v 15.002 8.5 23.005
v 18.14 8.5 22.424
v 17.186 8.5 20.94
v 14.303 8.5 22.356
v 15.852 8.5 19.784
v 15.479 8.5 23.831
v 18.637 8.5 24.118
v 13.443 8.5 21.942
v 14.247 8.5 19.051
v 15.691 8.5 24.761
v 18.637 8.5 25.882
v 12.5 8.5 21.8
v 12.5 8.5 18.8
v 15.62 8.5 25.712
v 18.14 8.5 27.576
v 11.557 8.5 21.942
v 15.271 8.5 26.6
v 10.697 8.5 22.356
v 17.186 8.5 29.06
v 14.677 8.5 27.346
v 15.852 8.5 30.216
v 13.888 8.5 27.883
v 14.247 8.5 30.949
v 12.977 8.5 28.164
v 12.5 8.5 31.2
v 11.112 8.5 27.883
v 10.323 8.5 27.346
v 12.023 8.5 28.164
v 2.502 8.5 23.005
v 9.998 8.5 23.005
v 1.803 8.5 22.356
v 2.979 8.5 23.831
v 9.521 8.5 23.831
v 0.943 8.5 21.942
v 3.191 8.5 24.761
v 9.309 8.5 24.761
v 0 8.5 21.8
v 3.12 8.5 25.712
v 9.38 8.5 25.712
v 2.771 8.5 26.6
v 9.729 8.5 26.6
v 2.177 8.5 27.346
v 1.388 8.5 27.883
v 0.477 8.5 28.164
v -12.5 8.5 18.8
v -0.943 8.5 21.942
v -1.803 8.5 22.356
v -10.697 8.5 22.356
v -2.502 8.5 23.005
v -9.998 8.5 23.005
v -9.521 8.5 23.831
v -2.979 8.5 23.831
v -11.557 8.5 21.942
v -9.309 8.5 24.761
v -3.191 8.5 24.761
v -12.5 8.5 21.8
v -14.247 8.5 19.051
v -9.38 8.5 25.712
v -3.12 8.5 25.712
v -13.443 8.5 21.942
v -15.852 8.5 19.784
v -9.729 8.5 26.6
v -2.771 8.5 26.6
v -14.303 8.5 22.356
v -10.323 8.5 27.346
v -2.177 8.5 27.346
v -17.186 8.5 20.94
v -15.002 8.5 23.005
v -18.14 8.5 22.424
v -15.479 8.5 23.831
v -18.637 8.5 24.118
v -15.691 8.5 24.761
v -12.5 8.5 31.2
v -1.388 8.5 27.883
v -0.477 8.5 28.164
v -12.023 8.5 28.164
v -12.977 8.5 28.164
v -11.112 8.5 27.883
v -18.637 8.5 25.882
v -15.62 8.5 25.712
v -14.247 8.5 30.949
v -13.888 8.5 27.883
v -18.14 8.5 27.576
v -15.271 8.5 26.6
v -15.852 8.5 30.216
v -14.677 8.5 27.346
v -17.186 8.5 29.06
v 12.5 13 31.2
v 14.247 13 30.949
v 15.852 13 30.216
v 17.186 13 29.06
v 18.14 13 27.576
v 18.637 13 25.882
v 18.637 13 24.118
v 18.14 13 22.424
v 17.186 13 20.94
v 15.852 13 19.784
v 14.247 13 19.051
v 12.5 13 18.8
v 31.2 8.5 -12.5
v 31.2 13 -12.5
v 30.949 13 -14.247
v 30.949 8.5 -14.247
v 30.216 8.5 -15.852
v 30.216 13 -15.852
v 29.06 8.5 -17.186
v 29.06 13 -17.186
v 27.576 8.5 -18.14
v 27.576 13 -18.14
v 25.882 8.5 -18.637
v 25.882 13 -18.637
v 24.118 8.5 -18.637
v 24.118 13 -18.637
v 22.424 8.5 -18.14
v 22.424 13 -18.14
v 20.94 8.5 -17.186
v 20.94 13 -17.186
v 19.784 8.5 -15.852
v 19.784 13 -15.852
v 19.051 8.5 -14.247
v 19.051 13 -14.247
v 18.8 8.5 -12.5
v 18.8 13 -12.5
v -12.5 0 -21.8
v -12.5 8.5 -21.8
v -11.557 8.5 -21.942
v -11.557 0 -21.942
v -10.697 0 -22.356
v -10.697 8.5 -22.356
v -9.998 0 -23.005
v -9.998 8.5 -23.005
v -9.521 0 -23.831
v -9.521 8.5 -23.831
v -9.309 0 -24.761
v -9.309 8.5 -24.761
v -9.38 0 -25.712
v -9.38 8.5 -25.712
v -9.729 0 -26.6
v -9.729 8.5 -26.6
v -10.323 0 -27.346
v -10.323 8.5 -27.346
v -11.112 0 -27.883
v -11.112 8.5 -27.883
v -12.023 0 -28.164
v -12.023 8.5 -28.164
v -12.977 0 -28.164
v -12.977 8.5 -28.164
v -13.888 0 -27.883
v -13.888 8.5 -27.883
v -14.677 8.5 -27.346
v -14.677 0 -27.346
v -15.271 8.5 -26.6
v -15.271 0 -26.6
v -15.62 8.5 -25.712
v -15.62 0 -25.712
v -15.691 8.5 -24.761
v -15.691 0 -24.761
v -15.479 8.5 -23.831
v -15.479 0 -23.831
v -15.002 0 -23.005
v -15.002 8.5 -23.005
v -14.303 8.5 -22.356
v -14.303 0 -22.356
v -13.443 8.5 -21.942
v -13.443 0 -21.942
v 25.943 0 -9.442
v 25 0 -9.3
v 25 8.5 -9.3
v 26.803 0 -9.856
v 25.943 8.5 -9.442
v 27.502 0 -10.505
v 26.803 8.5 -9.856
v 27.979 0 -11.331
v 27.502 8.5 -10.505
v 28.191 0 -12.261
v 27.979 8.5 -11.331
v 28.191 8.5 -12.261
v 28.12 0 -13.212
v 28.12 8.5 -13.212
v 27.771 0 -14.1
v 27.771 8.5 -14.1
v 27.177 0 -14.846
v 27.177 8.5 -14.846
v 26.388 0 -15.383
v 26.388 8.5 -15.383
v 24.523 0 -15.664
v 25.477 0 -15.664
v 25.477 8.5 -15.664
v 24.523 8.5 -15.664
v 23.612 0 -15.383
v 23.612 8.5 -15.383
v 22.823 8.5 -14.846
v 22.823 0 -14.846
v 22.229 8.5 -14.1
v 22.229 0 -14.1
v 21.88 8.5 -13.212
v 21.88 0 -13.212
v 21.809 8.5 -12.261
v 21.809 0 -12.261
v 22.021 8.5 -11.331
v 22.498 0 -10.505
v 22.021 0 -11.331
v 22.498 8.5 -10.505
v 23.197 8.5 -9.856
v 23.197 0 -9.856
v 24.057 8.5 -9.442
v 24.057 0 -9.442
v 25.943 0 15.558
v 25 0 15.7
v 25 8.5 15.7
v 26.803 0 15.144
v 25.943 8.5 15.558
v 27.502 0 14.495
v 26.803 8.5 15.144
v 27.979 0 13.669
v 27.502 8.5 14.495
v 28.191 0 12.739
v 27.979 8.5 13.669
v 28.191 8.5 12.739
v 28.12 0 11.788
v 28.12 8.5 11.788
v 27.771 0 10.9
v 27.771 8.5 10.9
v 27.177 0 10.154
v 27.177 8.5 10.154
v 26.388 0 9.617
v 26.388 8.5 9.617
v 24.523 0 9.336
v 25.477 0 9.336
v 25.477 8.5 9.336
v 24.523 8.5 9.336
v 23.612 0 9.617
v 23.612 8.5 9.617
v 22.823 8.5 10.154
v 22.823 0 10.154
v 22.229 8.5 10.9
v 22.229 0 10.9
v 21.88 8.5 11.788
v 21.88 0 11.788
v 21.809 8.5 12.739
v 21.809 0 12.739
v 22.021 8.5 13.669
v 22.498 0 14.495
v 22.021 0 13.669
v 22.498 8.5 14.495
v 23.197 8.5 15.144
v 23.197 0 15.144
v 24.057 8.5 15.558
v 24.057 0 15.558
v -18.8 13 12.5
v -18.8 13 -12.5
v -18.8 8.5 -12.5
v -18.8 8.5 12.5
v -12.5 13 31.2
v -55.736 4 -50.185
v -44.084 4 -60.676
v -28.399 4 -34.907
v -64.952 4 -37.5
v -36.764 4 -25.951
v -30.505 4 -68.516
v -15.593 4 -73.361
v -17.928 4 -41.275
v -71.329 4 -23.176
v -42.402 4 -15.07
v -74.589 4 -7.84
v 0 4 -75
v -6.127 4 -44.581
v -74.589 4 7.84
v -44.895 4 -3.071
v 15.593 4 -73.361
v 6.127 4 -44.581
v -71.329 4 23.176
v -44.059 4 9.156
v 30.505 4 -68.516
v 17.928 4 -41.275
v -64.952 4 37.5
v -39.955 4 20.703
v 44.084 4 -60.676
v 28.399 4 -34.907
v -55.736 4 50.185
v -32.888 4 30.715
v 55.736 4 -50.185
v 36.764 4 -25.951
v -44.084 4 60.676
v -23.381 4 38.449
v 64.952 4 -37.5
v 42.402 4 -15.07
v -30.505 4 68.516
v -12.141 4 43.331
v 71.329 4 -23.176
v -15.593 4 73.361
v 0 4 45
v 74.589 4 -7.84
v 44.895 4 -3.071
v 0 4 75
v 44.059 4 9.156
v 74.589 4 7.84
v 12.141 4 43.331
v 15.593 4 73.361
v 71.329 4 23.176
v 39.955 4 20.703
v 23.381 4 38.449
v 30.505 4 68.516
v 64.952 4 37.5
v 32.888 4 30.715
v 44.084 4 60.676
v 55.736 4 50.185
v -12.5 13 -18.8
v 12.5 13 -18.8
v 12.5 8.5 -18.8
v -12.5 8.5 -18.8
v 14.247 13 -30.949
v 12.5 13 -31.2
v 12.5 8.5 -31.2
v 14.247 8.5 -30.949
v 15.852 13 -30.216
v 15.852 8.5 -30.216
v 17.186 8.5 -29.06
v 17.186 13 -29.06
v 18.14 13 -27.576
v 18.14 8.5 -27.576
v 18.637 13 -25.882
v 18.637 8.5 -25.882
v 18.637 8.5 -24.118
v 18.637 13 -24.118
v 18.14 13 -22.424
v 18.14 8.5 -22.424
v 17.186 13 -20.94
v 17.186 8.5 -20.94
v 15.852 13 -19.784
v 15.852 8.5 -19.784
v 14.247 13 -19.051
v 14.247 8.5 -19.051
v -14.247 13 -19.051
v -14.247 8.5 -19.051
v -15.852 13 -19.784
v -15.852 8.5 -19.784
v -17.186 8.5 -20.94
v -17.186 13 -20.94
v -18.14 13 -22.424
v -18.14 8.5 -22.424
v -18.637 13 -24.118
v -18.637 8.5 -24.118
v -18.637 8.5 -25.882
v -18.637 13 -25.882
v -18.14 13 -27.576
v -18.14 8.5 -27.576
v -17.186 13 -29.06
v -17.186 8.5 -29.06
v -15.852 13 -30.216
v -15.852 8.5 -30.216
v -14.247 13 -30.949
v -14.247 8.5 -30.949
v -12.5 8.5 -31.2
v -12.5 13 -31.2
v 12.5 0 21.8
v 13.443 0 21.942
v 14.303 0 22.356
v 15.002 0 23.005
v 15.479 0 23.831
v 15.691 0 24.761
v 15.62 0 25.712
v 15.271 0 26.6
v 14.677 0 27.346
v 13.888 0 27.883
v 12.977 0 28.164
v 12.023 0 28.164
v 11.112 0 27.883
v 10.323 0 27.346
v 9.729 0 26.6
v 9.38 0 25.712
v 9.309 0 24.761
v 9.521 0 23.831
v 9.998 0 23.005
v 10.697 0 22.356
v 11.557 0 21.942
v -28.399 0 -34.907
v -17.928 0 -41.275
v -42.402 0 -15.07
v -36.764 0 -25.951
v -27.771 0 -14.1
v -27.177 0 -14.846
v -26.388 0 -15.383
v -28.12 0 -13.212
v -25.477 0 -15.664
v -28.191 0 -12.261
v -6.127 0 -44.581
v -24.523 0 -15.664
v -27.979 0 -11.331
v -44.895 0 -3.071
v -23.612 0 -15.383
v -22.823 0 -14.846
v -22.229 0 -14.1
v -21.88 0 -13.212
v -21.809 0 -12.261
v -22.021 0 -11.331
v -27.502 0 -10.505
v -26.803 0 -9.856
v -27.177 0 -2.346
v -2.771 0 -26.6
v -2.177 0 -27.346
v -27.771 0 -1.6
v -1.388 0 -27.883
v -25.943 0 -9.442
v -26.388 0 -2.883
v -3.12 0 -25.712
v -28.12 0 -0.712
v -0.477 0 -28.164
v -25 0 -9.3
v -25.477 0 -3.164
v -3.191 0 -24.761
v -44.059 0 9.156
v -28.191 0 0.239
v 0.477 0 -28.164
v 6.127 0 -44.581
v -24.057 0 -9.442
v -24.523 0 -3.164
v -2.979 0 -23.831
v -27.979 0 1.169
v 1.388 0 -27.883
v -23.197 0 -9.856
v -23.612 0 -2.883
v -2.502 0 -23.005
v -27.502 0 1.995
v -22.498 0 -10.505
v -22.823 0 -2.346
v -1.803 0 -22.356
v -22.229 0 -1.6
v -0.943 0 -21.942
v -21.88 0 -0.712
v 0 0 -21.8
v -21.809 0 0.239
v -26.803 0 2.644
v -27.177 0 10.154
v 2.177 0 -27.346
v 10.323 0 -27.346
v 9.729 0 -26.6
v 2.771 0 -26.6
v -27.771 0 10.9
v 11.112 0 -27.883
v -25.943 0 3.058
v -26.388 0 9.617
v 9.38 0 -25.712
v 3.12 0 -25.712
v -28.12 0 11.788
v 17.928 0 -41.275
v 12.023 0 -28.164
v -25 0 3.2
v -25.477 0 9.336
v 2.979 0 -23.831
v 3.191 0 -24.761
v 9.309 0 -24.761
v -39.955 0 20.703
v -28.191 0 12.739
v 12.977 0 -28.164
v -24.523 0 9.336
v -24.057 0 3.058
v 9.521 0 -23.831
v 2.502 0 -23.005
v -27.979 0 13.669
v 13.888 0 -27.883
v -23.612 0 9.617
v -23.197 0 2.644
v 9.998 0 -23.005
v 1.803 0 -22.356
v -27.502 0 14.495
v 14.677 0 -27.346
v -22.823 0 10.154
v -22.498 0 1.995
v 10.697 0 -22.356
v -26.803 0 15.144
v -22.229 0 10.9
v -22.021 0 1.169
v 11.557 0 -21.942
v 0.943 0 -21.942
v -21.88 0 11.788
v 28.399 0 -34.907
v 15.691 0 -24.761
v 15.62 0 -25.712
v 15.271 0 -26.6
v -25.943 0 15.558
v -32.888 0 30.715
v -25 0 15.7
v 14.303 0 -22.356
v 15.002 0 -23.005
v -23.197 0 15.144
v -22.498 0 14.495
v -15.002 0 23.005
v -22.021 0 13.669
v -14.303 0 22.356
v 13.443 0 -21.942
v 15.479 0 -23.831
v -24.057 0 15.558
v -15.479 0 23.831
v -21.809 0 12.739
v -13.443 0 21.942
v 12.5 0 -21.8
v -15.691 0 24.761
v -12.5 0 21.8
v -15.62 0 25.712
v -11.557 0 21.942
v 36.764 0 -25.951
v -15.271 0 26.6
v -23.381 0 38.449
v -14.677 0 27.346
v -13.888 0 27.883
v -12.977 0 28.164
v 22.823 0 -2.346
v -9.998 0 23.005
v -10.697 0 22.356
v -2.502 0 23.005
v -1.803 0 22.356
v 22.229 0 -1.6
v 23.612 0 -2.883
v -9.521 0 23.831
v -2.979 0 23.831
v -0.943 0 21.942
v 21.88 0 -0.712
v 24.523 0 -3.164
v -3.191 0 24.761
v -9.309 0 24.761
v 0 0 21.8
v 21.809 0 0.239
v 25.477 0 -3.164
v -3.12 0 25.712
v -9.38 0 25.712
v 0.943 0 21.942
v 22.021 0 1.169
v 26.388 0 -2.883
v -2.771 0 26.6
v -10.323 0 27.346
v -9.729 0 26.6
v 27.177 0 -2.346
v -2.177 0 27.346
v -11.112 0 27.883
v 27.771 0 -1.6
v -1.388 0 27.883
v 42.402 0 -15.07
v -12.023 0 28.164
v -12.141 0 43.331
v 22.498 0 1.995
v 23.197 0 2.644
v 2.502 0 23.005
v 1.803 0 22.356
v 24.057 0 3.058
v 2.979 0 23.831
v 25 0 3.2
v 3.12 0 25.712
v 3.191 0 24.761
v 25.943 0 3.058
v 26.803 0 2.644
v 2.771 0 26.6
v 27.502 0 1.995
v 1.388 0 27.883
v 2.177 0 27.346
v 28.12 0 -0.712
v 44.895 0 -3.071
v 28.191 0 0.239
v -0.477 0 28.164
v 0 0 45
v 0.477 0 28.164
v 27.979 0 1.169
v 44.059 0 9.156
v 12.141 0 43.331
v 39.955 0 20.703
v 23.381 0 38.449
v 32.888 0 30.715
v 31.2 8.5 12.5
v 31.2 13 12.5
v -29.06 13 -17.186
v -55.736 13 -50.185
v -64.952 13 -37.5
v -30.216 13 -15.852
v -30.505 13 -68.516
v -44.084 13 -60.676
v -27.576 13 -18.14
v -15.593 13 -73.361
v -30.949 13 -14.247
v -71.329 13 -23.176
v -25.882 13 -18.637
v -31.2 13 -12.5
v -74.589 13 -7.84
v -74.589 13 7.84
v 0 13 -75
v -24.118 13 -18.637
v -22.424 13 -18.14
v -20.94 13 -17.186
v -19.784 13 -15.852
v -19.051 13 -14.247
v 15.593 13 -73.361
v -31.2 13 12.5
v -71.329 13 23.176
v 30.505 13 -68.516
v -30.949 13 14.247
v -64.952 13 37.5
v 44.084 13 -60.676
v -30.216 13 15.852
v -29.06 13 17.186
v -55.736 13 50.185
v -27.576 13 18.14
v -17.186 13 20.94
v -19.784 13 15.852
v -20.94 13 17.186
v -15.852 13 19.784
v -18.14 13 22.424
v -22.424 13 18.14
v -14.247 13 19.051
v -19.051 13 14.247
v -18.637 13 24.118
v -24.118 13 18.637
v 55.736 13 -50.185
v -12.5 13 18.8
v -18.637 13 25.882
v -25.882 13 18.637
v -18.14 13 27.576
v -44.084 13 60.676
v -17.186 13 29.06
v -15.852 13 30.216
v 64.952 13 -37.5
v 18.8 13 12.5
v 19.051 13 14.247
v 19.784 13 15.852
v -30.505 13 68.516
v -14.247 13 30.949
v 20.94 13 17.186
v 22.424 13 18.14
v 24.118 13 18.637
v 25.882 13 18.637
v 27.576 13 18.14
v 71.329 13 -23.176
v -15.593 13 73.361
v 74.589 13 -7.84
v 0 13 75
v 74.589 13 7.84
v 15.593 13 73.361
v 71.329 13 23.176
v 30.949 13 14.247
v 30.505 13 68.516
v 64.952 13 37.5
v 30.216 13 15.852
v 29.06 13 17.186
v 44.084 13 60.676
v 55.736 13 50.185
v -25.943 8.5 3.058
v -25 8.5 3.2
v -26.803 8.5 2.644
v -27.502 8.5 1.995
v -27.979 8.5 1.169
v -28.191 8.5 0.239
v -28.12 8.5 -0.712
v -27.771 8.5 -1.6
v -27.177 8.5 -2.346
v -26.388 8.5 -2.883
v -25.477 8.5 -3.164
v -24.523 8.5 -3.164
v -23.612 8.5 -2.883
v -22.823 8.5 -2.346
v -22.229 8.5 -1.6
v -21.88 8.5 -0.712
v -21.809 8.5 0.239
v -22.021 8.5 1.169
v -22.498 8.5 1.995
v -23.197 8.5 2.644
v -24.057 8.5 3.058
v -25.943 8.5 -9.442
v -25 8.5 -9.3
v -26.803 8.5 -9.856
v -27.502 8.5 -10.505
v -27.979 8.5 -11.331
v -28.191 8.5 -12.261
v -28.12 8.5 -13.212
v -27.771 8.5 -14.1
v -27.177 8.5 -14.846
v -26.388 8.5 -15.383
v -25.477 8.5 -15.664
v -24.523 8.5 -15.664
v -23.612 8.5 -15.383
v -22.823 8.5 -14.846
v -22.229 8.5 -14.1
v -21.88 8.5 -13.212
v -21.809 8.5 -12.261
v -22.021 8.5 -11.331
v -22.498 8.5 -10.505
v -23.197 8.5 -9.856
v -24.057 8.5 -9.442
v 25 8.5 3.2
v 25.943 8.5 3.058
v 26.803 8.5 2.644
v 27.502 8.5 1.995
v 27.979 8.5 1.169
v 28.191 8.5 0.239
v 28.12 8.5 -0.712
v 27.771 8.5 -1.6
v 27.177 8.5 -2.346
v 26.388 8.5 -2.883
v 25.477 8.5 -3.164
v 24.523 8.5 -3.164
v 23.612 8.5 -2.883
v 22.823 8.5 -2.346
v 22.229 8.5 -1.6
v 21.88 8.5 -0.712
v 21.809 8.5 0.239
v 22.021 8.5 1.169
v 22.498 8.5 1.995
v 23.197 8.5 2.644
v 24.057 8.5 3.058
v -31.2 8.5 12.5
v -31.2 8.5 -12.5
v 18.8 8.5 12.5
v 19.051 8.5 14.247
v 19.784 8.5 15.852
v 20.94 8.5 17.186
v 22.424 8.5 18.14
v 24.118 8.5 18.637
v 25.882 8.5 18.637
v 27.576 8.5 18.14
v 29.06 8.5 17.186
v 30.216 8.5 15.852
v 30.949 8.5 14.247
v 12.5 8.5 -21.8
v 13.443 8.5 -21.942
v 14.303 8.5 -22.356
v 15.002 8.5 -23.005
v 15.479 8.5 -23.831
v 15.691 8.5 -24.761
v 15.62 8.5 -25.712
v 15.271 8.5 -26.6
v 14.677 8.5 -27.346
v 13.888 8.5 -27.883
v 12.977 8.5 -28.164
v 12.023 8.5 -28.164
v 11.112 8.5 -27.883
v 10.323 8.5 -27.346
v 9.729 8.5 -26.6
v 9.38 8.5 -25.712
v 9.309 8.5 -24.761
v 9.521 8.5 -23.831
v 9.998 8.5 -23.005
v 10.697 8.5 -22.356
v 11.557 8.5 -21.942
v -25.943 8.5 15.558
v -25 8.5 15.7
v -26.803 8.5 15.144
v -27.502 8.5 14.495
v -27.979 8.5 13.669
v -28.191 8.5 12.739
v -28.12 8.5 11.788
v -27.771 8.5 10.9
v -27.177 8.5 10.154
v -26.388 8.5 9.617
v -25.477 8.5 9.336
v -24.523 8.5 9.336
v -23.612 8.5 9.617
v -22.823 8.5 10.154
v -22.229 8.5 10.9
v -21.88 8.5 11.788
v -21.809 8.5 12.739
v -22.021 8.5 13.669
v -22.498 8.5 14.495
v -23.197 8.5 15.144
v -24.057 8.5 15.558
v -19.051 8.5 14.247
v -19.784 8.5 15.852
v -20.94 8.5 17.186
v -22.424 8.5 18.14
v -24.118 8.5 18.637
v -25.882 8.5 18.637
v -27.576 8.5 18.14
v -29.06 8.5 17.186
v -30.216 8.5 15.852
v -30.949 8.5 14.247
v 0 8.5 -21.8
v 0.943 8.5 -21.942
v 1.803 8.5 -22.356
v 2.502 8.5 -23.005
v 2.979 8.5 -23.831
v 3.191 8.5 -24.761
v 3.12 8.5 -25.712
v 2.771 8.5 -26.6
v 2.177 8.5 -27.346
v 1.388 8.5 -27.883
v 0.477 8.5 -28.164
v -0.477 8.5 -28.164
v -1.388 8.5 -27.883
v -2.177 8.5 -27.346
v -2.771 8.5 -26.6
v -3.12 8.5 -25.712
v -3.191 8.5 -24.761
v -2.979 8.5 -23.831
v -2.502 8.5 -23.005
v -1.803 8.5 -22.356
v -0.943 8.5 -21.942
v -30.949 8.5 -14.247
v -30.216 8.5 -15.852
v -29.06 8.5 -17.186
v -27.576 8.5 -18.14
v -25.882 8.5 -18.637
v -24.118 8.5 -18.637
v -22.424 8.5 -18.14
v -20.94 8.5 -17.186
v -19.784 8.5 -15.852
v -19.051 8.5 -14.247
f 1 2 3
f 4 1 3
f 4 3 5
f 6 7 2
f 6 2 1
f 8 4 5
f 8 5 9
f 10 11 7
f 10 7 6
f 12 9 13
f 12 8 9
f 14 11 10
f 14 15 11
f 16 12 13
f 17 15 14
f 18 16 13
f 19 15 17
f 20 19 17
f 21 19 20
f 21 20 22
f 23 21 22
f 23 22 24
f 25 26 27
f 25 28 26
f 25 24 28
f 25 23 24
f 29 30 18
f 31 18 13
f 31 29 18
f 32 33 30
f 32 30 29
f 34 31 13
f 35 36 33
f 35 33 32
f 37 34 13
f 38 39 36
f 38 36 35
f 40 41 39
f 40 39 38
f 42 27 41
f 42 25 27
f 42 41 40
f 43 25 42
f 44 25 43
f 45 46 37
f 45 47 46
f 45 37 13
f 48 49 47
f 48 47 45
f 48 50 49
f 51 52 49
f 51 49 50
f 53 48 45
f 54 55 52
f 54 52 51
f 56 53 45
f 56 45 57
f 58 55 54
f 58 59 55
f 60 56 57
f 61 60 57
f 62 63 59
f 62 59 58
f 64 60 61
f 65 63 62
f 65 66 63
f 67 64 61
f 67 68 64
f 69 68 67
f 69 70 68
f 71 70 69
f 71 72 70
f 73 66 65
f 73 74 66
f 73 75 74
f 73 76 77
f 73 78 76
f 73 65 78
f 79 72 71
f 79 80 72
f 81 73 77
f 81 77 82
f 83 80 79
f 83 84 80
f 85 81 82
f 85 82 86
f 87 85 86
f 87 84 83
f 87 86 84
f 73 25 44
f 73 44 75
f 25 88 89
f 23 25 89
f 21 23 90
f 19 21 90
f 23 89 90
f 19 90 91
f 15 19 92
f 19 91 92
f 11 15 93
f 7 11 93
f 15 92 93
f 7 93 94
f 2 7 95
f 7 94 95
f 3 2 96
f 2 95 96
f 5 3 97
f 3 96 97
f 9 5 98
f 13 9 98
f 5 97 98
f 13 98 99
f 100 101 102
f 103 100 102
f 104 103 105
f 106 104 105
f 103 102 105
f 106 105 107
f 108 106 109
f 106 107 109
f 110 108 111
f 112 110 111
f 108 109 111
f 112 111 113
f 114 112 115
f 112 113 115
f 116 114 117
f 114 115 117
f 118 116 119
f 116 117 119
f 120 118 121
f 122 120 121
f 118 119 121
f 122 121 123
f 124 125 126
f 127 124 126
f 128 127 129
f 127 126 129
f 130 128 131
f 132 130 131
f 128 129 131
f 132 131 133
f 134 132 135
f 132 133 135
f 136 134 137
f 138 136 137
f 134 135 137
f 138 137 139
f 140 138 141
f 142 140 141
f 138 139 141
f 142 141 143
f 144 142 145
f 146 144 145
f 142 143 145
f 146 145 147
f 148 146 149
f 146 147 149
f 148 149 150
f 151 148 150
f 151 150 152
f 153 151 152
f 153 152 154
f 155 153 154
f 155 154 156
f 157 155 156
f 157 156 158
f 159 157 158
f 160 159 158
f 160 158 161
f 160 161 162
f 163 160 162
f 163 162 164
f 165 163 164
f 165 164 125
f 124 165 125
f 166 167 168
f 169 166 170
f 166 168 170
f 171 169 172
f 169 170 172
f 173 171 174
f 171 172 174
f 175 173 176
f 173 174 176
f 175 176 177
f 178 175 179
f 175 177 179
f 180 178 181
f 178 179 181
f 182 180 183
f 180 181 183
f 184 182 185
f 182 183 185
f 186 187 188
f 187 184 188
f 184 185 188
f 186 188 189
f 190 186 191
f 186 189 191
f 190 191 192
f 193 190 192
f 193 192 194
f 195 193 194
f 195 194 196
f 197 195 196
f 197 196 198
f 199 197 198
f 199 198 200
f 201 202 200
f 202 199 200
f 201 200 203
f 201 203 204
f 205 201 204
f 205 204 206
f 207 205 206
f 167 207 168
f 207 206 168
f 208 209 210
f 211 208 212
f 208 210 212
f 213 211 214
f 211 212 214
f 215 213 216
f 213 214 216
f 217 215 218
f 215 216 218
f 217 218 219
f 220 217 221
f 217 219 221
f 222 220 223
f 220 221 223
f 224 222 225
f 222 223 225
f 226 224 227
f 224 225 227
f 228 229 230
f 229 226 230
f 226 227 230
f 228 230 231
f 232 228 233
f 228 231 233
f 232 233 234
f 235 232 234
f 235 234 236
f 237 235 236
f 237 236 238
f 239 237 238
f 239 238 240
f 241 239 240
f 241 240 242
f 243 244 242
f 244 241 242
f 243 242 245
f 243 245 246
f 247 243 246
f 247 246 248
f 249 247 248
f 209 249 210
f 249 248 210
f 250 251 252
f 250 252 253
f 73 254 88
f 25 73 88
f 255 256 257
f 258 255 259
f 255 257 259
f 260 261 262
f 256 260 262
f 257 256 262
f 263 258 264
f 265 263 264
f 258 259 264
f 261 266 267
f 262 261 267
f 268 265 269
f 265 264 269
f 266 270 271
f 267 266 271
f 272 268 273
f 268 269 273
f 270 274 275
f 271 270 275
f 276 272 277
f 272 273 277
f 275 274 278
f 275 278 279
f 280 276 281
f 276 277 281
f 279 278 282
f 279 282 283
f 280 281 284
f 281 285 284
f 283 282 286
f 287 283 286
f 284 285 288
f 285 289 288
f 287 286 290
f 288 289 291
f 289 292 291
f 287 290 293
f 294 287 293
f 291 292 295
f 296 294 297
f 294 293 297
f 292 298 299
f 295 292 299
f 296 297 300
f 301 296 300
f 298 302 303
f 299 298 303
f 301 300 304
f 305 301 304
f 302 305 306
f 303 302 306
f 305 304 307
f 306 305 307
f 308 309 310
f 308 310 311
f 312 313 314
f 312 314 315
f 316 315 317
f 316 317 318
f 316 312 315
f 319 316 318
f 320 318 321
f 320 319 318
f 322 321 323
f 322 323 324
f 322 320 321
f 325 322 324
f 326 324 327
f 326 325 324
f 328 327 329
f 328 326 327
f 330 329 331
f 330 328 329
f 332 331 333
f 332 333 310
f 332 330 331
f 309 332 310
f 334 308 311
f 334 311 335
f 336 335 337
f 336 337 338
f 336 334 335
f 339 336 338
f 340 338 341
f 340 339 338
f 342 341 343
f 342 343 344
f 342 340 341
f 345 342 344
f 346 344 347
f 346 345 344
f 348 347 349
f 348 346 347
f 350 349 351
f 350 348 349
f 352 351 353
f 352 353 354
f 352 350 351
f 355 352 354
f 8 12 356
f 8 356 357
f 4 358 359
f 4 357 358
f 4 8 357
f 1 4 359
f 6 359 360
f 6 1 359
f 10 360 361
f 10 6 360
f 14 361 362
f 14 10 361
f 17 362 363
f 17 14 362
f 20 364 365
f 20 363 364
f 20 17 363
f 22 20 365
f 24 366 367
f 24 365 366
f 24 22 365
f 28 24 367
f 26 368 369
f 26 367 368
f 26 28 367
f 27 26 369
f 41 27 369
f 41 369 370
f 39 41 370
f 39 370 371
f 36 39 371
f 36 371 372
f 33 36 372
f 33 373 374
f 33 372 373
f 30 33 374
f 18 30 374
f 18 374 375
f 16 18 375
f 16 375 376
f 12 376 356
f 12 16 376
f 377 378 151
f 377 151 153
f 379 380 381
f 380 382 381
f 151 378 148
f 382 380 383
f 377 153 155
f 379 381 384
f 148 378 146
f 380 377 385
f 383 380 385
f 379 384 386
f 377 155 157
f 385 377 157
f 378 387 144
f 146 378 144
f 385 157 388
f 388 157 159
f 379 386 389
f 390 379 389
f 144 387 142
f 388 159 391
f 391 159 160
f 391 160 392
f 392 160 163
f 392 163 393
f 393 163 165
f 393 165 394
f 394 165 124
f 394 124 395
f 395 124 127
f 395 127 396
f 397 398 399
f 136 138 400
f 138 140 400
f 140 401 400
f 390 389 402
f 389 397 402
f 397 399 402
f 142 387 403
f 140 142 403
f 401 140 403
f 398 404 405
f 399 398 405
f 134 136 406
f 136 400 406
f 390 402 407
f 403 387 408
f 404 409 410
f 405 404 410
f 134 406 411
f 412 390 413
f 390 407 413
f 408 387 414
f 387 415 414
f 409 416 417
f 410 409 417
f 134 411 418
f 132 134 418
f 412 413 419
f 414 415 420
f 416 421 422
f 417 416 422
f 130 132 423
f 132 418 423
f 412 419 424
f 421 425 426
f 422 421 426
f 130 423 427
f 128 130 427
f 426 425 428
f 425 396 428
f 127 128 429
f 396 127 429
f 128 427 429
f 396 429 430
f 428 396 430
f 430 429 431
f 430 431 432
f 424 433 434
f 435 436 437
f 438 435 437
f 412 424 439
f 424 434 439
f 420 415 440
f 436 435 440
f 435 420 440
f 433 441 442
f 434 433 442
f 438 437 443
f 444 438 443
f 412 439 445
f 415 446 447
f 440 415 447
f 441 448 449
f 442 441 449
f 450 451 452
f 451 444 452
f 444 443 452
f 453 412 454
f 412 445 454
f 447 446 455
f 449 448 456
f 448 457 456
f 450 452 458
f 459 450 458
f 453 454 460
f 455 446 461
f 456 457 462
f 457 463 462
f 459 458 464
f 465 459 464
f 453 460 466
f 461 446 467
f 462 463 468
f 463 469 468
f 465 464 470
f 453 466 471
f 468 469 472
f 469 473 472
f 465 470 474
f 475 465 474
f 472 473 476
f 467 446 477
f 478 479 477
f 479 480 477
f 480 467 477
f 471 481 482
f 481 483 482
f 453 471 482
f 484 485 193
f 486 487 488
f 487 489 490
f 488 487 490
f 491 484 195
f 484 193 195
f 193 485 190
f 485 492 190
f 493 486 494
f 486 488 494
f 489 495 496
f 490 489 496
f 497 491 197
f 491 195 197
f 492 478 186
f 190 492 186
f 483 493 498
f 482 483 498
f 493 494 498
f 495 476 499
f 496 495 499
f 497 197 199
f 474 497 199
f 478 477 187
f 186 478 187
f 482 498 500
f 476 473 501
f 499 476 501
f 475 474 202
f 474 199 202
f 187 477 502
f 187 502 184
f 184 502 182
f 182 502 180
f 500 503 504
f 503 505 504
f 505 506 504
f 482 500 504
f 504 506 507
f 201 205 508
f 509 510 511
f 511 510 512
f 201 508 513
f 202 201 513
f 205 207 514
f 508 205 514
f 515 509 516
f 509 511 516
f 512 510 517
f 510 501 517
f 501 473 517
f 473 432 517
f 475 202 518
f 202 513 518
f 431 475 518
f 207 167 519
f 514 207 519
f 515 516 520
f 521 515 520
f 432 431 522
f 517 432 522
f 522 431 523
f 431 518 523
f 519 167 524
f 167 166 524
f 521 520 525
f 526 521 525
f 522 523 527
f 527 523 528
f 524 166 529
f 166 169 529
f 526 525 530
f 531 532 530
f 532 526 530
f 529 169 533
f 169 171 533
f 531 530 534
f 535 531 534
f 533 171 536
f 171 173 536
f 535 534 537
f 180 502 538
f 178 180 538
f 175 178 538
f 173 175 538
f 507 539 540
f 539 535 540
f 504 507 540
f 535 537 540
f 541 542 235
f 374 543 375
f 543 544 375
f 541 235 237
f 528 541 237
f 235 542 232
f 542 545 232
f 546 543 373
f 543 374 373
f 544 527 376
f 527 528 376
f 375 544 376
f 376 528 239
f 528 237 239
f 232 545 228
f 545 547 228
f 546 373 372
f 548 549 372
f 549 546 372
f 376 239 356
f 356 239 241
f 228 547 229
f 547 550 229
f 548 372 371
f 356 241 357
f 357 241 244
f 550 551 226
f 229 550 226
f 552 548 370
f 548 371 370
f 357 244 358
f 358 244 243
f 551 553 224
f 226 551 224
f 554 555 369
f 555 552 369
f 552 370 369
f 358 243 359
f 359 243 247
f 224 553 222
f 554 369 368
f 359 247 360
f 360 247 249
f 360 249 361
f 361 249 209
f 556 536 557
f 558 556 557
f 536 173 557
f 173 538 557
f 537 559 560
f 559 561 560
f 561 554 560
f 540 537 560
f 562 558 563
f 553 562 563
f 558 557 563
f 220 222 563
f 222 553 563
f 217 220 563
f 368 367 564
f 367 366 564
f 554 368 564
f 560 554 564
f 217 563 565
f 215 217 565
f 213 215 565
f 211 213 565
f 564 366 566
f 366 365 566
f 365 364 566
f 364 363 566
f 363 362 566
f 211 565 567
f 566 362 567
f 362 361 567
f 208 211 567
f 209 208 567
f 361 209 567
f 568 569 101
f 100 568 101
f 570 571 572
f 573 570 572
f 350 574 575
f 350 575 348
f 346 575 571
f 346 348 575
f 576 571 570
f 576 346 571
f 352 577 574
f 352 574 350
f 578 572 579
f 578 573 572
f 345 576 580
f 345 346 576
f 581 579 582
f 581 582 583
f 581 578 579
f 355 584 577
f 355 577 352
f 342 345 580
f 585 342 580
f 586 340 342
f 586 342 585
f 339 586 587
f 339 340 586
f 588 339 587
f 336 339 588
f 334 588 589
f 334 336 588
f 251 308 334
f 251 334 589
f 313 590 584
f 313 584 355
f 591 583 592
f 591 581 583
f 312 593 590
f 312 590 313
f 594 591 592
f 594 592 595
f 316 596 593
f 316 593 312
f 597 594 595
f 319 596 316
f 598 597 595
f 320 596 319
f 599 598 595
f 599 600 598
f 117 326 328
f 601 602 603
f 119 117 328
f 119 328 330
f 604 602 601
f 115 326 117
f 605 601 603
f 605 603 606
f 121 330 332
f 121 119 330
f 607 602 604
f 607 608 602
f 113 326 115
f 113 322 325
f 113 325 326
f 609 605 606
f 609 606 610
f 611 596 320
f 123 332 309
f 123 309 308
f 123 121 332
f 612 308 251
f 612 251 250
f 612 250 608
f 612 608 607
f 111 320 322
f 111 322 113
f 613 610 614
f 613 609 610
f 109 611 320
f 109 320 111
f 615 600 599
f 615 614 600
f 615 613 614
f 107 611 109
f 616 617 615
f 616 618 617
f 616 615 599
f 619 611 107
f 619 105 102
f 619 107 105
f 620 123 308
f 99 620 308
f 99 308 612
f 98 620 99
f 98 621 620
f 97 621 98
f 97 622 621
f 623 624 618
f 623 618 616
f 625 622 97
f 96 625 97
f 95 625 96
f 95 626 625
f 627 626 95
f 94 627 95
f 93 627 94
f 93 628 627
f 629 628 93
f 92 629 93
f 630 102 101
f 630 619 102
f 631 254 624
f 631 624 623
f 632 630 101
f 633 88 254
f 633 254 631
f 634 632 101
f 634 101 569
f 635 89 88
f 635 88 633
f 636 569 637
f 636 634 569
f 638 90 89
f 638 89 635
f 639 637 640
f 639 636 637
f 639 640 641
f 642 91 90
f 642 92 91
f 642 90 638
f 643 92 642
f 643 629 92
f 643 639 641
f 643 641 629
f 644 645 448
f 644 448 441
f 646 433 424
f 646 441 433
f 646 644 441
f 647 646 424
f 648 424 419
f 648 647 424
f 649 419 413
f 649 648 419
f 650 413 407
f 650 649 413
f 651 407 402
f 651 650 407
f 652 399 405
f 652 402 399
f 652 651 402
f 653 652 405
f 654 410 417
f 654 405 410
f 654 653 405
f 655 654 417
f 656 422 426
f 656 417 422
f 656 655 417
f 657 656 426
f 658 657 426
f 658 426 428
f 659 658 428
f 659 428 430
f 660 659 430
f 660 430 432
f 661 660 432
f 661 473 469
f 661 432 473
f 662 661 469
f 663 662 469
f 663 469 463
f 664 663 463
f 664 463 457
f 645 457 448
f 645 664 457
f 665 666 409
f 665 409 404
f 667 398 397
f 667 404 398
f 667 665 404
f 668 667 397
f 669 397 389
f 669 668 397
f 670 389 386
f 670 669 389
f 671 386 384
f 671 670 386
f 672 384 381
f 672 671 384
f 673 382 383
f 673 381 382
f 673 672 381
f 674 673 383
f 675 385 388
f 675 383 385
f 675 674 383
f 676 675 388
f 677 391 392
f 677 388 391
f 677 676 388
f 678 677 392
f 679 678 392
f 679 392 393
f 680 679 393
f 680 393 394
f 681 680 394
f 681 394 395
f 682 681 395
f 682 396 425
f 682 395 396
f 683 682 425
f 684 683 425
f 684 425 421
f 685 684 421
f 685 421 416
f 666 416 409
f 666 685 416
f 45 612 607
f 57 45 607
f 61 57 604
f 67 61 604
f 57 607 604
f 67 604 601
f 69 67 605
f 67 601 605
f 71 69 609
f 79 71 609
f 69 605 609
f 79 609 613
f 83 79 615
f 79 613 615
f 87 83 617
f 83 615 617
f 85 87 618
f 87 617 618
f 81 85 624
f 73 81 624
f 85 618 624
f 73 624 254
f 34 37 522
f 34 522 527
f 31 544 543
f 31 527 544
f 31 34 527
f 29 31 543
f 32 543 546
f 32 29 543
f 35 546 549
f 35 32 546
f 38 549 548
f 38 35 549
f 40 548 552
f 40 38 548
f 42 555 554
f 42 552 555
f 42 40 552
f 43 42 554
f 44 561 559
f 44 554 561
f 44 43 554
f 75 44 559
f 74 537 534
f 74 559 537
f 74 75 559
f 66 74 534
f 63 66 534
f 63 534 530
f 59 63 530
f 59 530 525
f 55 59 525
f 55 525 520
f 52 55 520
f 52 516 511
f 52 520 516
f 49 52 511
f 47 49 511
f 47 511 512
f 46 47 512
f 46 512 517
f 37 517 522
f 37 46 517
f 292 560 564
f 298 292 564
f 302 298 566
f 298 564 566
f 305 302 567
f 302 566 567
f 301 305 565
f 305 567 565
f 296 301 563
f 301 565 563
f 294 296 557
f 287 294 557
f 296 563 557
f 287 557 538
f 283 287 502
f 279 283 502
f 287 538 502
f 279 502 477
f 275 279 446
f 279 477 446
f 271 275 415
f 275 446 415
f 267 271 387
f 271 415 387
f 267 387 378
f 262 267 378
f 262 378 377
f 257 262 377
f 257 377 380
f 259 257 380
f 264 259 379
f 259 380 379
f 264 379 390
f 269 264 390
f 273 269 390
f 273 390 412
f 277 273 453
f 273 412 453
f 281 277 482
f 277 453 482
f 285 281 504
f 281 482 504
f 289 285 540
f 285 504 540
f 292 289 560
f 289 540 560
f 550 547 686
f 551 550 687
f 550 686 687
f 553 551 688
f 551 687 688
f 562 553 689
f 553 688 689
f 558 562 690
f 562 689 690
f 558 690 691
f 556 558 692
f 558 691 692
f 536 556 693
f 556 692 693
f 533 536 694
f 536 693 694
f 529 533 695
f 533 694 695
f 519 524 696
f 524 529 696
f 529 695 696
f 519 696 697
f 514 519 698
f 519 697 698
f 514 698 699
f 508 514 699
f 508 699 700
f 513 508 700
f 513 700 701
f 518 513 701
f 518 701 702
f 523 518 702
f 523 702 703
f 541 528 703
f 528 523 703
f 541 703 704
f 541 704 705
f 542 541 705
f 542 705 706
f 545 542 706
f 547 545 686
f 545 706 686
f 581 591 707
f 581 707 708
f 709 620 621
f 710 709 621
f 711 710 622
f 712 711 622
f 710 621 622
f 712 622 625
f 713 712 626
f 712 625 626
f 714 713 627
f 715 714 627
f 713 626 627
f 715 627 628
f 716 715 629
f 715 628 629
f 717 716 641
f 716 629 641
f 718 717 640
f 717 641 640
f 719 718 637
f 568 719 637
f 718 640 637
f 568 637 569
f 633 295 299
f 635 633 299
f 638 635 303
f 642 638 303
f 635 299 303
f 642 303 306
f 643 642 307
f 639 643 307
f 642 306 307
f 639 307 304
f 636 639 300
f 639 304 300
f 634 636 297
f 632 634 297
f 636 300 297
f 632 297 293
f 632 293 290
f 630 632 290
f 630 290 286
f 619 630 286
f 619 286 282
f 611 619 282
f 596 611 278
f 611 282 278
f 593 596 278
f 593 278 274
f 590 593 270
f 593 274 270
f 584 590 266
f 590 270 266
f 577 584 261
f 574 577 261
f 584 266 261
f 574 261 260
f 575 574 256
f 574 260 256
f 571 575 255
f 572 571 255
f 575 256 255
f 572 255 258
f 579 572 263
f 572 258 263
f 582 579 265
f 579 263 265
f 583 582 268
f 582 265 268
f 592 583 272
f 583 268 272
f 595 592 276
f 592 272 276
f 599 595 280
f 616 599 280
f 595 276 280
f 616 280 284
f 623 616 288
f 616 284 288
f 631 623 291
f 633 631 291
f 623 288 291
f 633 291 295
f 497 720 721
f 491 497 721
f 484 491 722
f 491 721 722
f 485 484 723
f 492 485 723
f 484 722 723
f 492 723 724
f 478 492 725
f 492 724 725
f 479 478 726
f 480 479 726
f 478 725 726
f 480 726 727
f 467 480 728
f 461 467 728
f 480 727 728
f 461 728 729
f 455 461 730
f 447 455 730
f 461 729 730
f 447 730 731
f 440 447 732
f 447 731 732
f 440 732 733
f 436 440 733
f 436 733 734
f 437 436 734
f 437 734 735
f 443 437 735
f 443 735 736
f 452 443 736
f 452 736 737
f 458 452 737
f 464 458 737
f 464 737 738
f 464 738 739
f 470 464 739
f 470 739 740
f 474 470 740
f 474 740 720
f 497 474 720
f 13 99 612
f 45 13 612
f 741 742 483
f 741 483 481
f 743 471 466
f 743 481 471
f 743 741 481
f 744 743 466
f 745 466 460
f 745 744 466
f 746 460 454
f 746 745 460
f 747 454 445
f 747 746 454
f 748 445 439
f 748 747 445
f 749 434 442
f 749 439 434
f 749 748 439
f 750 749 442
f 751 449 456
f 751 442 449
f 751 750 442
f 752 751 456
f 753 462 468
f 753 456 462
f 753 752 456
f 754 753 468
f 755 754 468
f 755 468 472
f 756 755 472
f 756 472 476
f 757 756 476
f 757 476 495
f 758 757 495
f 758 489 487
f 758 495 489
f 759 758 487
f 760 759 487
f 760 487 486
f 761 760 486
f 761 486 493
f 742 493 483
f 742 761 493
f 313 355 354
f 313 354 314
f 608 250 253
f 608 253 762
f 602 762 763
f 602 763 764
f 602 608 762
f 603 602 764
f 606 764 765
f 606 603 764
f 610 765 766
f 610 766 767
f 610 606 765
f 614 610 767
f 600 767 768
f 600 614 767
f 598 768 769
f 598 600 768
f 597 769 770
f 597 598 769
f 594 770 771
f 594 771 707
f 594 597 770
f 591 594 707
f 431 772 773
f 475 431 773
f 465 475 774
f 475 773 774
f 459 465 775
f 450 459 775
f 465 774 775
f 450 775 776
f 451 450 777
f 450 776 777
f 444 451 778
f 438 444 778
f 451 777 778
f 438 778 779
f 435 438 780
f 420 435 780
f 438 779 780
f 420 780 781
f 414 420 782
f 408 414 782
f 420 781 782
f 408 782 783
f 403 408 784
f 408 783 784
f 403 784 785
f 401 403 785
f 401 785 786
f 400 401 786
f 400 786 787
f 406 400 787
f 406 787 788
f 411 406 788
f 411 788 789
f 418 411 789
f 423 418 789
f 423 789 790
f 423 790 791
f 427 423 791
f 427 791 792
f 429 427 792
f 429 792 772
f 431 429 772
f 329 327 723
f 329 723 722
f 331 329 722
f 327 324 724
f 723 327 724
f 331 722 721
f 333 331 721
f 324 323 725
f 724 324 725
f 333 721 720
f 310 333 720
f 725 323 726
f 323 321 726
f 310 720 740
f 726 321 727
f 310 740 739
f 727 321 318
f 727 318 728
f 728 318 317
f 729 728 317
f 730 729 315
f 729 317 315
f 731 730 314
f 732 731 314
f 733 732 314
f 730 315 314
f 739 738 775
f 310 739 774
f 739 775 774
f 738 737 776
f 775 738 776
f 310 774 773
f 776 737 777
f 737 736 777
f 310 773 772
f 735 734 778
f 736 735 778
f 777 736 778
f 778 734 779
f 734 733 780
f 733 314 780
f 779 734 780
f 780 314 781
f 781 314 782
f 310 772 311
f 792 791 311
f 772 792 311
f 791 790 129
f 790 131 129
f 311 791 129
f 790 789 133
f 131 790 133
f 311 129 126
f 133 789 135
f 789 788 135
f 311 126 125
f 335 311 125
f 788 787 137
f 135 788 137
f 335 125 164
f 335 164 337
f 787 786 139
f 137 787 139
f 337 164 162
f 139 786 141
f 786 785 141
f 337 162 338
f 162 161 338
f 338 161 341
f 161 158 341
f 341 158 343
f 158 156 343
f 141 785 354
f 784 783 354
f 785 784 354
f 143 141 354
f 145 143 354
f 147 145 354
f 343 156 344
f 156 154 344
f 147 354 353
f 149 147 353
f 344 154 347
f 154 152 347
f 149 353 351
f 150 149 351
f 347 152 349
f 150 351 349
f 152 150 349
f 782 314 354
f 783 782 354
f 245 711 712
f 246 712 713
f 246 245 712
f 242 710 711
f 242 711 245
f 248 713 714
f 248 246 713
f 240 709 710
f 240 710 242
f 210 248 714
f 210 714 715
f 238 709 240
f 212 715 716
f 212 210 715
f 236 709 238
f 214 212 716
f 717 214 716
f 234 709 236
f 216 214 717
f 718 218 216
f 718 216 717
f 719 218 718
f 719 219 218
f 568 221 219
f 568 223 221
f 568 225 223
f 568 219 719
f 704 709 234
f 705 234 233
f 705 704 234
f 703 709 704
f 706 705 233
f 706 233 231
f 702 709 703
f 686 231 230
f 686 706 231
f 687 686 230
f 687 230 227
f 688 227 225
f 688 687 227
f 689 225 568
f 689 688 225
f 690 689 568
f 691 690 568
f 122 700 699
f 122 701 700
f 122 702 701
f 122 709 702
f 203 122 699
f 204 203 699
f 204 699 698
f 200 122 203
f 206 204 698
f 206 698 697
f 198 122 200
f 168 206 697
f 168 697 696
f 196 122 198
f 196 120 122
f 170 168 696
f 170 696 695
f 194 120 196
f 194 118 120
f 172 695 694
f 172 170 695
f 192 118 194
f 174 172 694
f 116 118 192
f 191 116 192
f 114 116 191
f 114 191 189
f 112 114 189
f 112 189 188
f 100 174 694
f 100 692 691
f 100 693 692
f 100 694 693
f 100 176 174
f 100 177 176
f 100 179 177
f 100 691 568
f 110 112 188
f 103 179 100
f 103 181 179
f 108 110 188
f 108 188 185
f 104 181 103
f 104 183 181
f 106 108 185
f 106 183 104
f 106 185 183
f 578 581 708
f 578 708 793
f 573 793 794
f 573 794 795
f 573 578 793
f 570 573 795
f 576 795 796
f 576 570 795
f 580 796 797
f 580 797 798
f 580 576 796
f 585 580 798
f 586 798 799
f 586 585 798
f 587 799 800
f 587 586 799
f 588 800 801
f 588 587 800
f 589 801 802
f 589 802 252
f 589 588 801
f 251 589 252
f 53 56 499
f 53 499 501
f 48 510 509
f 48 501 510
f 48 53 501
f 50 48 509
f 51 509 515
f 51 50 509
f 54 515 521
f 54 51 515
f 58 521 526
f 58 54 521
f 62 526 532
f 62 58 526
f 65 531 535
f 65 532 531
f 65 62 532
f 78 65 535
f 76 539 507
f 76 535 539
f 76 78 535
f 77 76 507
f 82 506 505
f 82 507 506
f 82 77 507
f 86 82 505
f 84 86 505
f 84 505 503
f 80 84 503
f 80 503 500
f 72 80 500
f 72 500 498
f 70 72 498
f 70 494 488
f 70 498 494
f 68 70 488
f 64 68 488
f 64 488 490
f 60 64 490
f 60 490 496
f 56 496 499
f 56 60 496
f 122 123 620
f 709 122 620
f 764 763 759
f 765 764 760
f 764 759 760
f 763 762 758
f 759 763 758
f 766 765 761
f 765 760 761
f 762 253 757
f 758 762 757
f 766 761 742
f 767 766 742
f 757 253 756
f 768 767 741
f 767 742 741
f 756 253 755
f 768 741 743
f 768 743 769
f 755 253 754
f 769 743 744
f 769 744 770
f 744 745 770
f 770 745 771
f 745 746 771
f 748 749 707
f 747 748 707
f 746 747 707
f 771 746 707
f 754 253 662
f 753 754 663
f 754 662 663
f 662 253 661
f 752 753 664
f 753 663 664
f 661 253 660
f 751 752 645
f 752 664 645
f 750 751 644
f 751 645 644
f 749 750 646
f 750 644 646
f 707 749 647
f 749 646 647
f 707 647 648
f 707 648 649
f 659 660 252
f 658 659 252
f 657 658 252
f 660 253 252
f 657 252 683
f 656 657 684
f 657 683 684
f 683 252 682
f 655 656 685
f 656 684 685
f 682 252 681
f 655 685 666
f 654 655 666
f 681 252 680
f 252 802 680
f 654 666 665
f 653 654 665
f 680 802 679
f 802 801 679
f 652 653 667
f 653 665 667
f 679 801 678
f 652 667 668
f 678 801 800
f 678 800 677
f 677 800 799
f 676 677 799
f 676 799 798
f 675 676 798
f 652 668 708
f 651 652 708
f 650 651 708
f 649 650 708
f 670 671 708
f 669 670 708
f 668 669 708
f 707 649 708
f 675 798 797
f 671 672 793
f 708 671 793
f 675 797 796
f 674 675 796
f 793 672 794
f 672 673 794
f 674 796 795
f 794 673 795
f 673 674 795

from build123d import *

# Parameters (mm, degrees)
SKETCH_1_R          = 45
EXTRUDE_1_DEPTH     = 4
SKETCH_2_R          = 75
EXTRUDE_2_DEPTH     = 9
SKETCH_3_R          = 3.2
CUT_EXTRUDE_1_DEPTH = 107.85972113
CUT_EXTRUDE_2_DEPTH = 4.5


with BuildPart() as part:
    # 草图1 → 凸台-拉伸1 (new body)
    with BuildSketch(Plane(origin=(0, 0, 0), x_dir=(1, 0, 0), z_dir=(0, 1, 0))):
        with Locations(Location((0, 0, 0), (0, 0, 270))):
            Circle(SKETCH_1_R)
    extrude(amount=EXTRUDE_1_DEPTH)

    # 草图2 → 凸台-拉伸2 (add)
    with BuildSketch(Plane(origin=(0, 4, 0), x_dir=(1, 0, 0), z_dir=(0, 1, 0))):
        with Locations(Location((0, 0, 0), (0, 0, 270))):
            Circle(SKETCH_2_R)
    extrude(amount=EXTRUDE_2_DEPTH)

    # 草图3 → 切除-拉伸1 (cut, through all)
    with BuildSketch(Plane(origin=(0, 13, 0), x_dir=(1, 0, 0), z_dir=(0, 1, 0))):
        with Locations(Location((-12.5, 25, 0), (0, 0, 270))):
            Circle(SKETCH_3_R)
        with Locations(Location((0, 25, 0), (0, 0, 270))):
            Circle(SKETCH_3_R)
        with Locations(Location((12.5, 25, 0), (0, 0, 270))):
            Circle(SKETCH_3_R)
        with Locations(Location((25, 0, 0), (0, 0, 270))):
            Circle(SKETCH_3_R)
        with Locations(Location((25, 12.5, 0), (0, 0, 270))):
            Circle(SKETCH_3_R)
        with Locations(Location((25, -12.5, 0), (0, 0, 270))):
            Circle(SKETCH_3_R)
    cut_extrude_1 = extrude(amount=-CUT_EXTRUDE_1_DEPTH, mode=Mode.SUBTRACT)

    # 镜向1: 切除-拉伸1 across plane
    add(cut_extrude_1.mirror(Plane(origin=(0, 0, 0), x_dir=(0, 0, 1), z_dir=(1, 0, 0))), mode=Mode.SUBTRACT)

    # 镜向1 at the second plane: 切除-拉伸1 across plane
    add(cut_extrude_1.mirror(Plane.XY), mode=Mode.SUBTRACT)

    # 草图4 → 切除-拉伸2 (cut)
    with BuildSketch(Plane(origin=(0, 13, 0), x_dir=(1, 0, 0), z_dir=(0, 1, 0))):
        with BuildLine():
            Line((-12.5, 31.2), (12.5, 31.2))
            ThreePointArc((12.5, 31.2), (18.7, 25), (12.5, 18.8))
            Line((12.5, 18.8), (-12.5, 18.8))
            ThreePointArc((-12.5, 18.8), (-18.7, 25), (-12.5, 31.2))
        make_face()
        with BuildLine():
            Line((-18.8, 12.5), (-18.8, -12.5))
            ThreePointArc((-18.8, -12.5), (-25, -18.7), (-31.2, -12.5))
            Line((-31.2, -12.5), (-31.2, 12.5))
            ThreePointArc((-31.2, 12.5), (-25, 18.7), (-18.8, 12.5))
        make_face()
    cut_extrude_2 = extrude(amount=-CUT_EXTRUDE_2_DEPTH, mode=Mode.SUBTRACT)

    # 镜向2: 切除-拉伸2 across plane
    add(cut_extrude_2.mirror(Plane(origin=(0, 0, 0), x_dir=(0, 0, 1), z_dir=(1, 0, 0))), mode=Mode.SUBTRACT)

    # 镜向2 at the second plane: 切除-拉伸2 across plane
    add(cut_extrude_2.mirror(Plane.XY), mode=Mode.SUBTRACT)


solid = part.part
